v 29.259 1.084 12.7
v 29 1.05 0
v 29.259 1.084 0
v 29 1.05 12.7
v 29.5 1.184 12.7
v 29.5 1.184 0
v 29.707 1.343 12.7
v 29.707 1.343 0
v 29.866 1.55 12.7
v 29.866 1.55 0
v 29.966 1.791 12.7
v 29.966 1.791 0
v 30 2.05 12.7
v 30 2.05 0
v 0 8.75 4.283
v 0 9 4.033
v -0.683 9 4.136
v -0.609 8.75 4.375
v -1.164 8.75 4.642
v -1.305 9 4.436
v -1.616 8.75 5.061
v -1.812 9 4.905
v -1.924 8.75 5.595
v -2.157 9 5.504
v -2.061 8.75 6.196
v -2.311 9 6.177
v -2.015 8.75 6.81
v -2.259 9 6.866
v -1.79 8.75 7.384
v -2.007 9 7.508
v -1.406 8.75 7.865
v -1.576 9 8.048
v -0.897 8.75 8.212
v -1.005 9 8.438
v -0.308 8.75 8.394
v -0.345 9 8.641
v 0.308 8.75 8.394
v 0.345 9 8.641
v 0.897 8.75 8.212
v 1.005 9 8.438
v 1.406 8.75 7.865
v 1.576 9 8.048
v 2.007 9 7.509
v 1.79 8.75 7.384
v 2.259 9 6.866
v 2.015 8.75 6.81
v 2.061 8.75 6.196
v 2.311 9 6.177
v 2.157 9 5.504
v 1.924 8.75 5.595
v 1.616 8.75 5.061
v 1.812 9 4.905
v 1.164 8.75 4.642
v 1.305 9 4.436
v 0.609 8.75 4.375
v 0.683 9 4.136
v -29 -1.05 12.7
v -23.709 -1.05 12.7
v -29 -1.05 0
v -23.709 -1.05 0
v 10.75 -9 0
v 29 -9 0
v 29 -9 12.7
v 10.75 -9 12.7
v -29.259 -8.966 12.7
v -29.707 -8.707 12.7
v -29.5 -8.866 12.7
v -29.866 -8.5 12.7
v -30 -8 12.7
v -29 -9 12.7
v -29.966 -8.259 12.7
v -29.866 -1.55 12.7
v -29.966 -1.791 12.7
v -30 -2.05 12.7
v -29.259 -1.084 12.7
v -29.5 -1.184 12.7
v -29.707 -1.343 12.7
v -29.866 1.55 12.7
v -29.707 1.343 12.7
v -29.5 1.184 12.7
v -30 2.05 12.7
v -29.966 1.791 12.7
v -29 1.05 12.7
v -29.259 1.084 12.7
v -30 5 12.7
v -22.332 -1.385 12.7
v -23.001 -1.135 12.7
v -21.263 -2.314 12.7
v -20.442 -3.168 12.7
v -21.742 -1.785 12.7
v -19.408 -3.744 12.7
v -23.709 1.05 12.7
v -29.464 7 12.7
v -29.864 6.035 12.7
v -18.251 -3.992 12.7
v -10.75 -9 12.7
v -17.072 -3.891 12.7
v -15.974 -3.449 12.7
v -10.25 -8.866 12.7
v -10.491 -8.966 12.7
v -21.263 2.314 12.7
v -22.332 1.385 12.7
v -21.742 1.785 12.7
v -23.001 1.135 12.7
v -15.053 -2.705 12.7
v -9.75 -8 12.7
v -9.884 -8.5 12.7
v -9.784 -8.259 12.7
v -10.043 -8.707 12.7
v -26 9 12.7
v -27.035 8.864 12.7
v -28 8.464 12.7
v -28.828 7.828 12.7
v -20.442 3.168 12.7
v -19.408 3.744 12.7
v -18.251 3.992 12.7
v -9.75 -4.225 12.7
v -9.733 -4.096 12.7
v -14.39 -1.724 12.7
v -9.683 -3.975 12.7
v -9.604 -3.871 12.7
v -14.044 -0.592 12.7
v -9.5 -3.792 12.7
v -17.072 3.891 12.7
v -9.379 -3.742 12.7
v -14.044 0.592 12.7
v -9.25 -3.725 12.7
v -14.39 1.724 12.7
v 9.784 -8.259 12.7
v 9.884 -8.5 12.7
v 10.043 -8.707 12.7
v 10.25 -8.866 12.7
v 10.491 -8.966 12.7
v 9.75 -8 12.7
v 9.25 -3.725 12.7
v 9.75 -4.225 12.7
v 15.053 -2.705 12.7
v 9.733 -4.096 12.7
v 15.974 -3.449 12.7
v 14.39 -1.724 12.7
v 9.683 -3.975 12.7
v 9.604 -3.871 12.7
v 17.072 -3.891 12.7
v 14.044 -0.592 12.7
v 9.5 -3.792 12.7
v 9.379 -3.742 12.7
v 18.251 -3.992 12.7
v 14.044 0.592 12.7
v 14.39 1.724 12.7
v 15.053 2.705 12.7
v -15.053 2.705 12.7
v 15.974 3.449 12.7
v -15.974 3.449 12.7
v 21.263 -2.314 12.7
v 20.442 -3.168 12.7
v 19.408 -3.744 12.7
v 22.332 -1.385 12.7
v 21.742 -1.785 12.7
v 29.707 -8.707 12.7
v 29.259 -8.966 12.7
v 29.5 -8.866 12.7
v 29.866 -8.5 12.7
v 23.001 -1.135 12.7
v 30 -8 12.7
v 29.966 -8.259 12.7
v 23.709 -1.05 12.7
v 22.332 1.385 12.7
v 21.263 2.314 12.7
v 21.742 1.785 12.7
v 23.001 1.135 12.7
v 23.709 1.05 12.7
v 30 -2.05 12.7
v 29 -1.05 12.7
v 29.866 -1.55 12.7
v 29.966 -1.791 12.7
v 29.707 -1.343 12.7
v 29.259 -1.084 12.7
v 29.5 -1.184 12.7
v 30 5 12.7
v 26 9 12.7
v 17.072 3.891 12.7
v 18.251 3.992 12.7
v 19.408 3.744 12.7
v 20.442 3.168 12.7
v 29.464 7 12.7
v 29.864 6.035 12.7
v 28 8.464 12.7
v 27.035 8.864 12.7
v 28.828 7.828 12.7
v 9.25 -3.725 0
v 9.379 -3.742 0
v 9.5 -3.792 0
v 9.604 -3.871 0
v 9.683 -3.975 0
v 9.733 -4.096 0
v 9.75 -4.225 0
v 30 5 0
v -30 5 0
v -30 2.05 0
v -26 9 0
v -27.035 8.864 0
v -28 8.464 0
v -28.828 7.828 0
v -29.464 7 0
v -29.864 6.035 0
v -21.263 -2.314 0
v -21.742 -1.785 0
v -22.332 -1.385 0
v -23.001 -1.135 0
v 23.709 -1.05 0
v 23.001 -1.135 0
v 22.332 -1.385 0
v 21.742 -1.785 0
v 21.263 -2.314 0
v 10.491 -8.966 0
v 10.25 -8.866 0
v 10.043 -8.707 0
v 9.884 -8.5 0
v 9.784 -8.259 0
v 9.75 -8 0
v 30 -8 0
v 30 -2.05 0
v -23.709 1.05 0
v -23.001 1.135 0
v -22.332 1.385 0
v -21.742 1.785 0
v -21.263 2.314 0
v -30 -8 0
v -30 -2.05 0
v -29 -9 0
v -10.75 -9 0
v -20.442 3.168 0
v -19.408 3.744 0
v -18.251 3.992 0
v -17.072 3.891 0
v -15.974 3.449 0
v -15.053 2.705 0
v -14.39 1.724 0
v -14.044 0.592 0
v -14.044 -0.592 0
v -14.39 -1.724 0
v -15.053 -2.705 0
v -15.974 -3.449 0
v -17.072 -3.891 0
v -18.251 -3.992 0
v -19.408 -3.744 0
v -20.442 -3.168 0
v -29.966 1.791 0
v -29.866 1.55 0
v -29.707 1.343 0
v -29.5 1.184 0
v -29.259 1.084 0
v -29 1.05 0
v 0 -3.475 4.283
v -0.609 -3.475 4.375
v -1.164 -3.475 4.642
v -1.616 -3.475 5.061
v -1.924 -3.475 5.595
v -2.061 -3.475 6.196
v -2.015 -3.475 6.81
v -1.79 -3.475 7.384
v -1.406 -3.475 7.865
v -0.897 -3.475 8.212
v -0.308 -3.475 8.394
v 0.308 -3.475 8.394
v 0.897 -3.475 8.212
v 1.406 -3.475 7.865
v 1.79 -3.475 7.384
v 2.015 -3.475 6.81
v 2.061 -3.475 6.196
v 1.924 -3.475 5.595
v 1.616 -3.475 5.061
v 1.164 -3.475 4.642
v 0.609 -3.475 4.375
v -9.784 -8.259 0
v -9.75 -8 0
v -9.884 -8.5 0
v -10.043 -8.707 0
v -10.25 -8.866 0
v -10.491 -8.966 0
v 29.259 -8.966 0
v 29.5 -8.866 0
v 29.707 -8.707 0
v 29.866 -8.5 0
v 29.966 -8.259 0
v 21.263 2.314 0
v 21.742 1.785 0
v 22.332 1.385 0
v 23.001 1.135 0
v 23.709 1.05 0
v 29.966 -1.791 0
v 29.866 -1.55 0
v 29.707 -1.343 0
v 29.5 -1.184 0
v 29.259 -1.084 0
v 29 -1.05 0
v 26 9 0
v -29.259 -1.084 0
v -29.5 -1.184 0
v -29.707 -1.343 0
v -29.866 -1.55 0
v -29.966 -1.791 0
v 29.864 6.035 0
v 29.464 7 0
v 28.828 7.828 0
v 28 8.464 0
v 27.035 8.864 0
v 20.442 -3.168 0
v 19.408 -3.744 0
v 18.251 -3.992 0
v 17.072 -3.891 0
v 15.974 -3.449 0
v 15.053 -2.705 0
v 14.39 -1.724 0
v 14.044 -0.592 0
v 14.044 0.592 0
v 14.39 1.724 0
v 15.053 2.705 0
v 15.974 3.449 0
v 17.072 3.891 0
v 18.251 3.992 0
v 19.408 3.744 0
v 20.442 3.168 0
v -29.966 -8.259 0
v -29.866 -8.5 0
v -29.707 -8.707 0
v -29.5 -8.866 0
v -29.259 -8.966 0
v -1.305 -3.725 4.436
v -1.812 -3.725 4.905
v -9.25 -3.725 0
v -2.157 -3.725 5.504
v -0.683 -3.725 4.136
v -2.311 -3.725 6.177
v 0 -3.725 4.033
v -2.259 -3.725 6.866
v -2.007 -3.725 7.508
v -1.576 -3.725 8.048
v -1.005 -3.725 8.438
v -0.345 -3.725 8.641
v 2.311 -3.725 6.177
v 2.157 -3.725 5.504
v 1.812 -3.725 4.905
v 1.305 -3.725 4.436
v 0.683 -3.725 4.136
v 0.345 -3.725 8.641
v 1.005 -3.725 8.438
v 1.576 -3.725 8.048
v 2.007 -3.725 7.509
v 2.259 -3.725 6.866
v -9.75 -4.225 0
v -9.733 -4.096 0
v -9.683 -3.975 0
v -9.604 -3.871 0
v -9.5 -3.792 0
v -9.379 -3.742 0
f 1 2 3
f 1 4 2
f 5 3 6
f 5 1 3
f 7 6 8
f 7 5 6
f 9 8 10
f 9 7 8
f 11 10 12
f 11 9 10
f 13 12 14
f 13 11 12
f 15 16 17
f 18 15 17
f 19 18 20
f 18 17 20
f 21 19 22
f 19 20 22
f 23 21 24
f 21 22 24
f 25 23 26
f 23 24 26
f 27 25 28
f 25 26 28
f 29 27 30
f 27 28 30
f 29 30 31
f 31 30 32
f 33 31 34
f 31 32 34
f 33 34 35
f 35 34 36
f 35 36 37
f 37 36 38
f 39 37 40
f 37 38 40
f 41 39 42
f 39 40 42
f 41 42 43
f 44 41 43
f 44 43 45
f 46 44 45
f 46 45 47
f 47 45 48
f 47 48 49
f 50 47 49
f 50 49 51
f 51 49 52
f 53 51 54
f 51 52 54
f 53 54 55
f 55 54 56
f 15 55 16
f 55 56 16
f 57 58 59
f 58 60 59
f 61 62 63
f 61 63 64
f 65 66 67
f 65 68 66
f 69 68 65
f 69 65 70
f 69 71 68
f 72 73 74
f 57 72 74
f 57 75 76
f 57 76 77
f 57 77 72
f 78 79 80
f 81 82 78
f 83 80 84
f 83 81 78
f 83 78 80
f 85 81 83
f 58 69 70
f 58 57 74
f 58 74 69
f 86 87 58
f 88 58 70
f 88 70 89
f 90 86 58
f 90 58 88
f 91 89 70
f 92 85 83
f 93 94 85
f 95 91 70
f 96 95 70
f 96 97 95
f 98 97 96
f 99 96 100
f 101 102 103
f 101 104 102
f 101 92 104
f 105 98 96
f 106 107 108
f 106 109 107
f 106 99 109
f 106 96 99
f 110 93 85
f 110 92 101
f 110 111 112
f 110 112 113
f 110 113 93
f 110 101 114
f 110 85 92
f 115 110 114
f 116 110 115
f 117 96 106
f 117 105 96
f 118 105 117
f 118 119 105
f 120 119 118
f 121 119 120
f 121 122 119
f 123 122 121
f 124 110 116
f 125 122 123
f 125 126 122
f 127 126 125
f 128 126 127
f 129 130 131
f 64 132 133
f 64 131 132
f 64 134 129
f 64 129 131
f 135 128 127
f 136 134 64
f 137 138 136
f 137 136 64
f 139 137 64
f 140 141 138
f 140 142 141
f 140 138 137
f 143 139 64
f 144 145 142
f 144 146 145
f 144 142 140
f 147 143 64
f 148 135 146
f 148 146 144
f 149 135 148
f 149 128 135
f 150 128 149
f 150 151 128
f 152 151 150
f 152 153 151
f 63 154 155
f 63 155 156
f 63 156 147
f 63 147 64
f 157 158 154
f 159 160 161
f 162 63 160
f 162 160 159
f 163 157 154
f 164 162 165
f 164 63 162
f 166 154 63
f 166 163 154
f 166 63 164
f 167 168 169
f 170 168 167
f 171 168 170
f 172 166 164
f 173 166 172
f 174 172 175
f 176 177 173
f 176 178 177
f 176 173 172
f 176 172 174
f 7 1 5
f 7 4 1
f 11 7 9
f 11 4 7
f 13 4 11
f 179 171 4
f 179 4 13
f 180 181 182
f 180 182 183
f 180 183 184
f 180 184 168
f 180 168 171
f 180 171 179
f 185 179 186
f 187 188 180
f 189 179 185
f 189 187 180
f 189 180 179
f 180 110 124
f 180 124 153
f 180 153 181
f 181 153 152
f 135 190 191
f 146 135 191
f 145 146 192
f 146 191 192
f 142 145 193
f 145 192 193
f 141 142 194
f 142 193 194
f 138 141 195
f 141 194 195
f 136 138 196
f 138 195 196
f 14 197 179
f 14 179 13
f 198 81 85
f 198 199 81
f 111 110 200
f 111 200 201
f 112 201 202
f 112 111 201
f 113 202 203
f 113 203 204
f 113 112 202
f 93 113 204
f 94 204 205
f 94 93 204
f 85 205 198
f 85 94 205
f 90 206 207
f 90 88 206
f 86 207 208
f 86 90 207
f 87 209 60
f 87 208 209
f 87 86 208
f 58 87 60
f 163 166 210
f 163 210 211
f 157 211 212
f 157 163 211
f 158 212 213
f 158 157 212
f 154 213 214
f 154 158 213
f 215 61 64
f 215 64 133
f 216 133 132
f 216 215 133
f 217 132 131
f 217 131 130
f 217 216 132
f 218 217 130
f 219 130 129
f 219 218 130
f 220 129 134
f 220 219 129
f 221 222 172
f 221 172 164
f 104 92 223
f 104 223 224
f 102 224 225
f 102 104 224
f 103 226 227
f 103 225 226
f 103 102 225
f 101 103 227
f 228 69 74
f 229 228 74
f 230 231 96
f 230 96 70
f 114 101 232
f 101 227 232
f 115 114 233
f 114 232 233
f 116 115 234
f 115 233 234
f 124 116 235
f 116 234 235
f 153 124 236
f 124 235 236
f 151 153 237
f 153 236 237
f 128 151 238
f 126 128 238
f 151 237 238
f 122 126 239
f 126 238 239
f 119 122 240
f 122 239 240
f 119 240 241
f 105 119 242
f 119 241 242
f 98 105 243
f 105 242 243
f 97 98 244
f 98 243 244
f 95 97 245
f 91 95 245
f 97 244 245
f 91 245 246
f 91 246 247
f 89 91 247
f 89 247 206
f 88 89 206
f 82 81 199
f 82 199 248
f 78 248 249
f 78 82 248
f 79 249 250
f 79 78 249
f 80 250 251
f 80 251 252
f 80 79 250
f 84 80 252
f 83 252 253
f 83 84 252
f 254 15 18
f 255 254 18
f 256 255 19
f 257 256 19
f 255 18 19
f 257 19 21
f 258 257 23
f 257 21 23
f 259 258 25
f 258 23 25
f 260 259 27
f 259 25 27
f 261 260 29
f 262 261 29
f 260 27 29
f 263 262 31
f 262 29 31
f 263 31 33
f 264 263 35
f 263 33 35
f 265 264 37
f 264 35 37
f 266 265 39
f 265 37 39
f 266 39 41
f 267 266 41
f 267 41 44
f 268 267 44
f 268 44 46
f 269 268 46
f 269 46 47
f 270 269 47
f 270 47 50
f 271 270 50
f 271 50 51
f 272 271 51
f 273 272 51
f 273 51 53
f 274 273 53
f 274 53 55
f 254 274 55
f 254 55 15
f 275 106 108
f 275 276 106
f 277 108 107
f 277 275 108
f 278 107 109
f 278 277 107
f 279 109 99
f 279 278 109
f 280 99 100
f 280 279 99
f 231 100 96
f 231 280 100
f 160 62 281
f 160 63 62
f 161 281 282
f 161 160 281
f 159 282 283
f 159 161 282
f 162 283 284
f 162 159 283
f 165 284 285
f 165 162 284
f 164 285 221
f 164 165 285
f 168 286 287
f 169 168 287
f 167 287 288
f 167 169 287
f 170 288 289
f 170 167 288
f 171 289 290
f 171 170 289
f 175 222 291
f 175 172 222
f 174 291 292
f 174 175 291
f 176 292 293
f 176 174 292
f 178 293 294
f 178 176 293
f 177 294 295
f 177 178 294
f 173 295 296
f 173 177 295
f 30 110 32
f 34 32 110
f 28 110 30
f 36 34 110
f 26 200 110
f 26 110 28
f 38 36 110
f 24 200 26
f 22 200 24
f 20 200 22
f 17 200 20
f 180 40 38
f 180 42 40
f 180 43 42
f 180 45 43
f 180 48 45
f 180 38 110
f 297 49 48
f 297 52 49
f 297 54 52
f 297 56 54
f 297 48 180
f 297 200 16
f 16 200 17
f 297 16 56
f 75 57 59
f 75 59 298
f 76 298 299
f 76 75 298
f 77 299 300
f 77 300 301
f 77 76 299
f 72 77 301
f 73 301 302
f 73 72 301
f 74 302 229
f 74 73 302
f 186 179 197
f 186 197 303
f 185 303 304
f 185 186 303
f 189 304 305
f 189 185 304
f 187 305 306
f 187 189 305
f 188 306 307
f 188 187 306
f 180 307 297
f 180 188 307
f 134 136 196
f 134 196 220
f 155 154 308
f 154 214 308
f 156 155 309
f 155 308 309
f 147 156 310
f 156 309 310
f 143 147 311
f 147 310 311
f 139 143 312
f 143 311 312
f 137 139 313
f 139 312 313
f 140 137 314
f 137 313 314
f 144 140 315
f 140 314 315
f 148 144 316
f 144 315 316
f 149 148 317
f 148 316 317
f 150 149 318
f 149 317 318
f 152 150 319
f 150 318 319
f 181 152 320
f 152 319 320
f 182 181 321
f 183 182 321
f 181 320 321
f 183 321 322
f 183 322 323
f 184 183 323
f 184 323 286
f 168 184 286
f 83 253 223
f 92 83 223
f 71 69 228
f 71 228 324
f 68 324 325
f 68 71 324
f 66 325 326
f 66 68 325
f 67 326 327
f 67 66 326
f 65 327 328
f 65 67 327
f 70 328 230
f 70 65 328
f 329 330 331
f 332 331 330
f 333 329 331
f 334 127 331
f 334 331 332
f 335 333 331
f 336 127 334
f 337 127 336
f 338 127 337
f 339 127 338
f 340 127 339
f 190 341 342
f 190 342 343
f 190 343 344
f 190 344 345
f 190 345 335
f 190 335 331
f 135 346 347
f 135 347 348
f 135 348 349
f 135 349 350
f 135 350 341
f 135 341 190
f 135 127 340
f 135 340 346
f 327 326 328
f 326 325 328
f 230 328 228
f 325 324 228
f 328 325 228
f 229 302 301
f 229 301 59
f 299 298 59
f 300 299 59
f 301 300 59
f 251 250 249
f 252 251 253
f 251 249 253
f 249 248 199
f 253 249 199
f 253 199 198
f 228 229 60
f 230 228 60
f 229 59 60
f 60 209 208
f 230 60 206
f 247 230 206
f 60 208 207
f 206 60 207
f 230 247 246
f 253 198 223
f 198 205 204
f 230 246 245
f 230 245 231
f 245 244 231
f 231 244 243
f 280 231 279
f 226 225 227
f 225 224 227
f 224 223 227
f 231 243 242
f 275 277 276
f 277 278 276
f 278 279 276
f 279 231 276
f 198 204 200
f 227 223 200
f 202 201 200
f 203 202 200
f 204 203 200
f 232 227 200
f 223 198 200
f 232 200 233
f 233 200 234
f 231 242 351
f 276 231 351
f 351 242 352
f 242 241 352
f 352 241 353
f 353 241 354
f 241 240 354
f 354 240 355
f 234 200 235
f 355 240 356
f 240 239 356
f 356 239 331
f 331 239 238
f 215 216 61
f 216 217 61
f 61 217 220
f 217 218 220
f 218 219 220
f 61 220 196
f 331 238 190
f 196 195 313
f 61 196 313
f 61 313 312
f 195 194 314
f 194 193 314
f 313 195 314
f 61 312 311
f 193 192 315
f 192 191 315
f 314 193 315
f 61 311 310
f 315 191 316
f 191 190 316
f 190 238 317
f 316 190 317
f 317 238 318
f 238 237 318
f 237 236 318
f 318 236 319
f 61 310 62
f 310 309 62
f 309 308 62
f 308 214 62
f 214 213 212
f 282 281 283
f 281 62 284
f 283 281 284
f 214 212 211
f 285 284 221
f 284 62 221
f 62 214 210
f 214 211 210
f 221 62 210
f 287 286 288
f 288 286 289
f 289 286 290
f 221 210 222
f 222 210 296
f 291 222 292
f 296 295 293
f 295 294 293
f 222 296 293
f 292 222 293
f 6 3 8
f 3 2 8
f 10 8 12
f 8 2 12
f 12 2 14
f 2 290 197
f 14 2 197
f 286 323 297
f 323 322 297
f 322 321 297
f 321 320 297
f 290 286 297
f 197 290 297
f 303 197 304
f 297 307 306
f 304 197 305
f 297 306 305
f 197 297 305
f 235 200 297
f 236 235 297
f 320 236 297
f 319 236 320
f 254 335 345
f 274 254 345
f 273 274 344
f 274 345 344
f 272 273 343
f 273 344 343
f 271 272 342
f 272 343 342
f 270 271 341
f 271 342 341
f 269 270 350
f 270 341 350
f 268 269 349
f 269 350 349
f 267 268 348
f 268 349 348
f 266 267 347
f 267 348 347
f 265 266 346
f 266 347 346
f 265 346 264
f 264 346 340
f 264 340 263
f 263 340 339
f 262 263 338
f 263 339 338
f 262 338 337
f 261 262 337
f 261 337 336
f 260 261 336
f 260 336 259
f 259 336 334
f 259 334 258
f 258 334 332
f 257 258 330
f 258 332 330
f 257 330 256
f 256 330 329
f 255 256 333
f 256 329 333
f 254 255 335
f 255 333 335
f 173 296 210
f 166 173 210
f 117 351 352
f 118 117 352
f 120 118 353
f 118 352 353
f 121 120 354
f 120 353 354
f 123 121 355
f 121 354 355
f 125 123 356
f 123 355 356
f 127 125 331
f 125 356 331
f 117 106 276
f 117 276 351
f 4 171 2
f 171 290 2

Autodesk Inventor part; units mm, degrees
ref_plane "YZ Plane" through (0, 0, 0) normal (1, 0, 0) x (0, 1, 0)
ref_plane "XZ Plane" through (0, 0, 0) normal (0, 1, 0) x (-1, 0, 0)
ref_plane "XY Plane" through (0, 0, 0) normal (0, 0, 1) x (1, 0, 0)
sketch "Sketch1" plane through (0, 0, 0) normal (0, 0, 1) x (1, 0, 0)
  line L0 (30, -9) -> (-30, -9)
  line L1 (-30, -9) -> (-30, 9)
  line L2 (-30, 9) -> (30, 9)
  line L3 (30, 9) -> (30, -9)
  line L4 (30, -9) -> (-30, 9) construction
  line L5 (-30, -9) -> (30, 9) construction
  circle A0 centre (-18, 0) radius 4
  circle A1 centre (18, 0) radius 4
  line L6 (-18, 0) -> (18, 0) construction
  line L7 (30, -1.05) -> (-30, -1.05)
  line L8 (-30, -1.05) -> (-30, 1.05) construction
  line L9 (-30, 1.05) -> (30, 1.05)
  line L10 (30, 1.05) -> (30, -1.05) construction
  line L11 (30, -1.05) -> (-30, 1.05) construction
  line L12 (-30, -1.05) -> (30, 1.05) construction
  point P0 (0, 0)
  point P1 (-21.8597, 1.05)
  point P2 (-21.8597, -1.05)
  point P3 (21.8597, -1.05)
  point P4 (21.8597, 1.05)
  dimension "d0" = 60
  dimension "d1" = 18
  dimension "d2" = 8
  dimension "d4" = 2.1
  dimension "d5" = 36
extrude "Extrusion1" add sketch "Sketch1" along normal blind 12.7 contours L0 L1 L7 A0 A1 L3 | L9 A1 A0 L1 L2 L3 | L7 A0 L9 A1
fillet "Fillet1" radius 3 4 edges at (-21.8597, 1.05, 6.35) (-21.8597, -1.05, 6.35) (21.8597, 1.05, 6.35) (21.8597, -1.05, 6.35)
sketch "Sketch2" plane through (0, 0, 12.7) normal (0, 0, 1) x (1, 0, 0)
  line L0 (9.75, -9) -> (-9.75, -9)
  line L1 (-9.75, -9) -> (-9.75, -3.725)
  line L2 (-9.75, -3.725) -> (9.75, -3.725)
  line L3 (9.75, -3.725) -> (9.75, -9)
  line L4 (9.75, -9) -> (-9.75, -3.725) construction
  line L5 (-9.75, -9) -> (9.75, -3.725) construction
  line L6 (-30, -9) -> (30, -9) projected
  arc A0 (-21.2625, -2.3143) -> (-21.2625, 2.3143) centre (-18, 0) ccw projected
  circle A1 centre (-18, 0) radius 9.052 construction
  point P0 (0, 0)
  point P1 (0, -6.3625)
  dimension "d9" = 3.725
  dimension "d10" = 5.052
  dimension "d11" = 19.5
extrude "Extrusion2" cut sketch "Sketch2" against normal up to surface (12.7 mm away)
fillet "Fillet2" radius 1 4 edges at (9.75, -9, 6.35) (-9.75, -9, 6.35) (-30, -9, 6.35) (30, -9, 6.35)
fillet "Fillet3" radius 4 2 edges at (30, 9, 6.35) (-30, 9, 6.35)
fillet "Fillet4" radius 1 4 edges at (-30, 1.05, 6.35) (-30, -1.05, 6.35) (30, 1.05, 6.35) (30, -1.05, 6.35)
fillet "Fillet5" radius 0.5 2 edges at (9.75, -3.725, 6.35) (-9.75, -3.725, 6.35)
sketch "Sketch3" plane through (-9.25, -3.725, 12.7) normal (0, -1, 0) x (1, 0, 0)
  line L0 (0, -12.7) -> (0, 0) projected
  line L1 (18.5, -12.7) -> (0, -12.7) projected
  line L2 (18.5, 0) -> (18.5, -12.7) projected
  line L3 (0, 0) -> (18.5, 0) projected
  line L4 (9.25, -12.7) -> (9.25, 0) construction
  point P0 (9.25, -6.35)
hole "Hole1" at (0, -3.725, 6.35) direction (0, 1, 0) diameter 4.134 end through all thread size "M5x0.8" class "6H" standard "ANSI Metric M Profile"
chamfer "Chamfer1" distance 0.25 angle 45 2 edges at (0, 9, 8.417) (0, -3.725, 8.417)
properties part number "Printhead Belt Retainer" material "Aluminum 6061"
